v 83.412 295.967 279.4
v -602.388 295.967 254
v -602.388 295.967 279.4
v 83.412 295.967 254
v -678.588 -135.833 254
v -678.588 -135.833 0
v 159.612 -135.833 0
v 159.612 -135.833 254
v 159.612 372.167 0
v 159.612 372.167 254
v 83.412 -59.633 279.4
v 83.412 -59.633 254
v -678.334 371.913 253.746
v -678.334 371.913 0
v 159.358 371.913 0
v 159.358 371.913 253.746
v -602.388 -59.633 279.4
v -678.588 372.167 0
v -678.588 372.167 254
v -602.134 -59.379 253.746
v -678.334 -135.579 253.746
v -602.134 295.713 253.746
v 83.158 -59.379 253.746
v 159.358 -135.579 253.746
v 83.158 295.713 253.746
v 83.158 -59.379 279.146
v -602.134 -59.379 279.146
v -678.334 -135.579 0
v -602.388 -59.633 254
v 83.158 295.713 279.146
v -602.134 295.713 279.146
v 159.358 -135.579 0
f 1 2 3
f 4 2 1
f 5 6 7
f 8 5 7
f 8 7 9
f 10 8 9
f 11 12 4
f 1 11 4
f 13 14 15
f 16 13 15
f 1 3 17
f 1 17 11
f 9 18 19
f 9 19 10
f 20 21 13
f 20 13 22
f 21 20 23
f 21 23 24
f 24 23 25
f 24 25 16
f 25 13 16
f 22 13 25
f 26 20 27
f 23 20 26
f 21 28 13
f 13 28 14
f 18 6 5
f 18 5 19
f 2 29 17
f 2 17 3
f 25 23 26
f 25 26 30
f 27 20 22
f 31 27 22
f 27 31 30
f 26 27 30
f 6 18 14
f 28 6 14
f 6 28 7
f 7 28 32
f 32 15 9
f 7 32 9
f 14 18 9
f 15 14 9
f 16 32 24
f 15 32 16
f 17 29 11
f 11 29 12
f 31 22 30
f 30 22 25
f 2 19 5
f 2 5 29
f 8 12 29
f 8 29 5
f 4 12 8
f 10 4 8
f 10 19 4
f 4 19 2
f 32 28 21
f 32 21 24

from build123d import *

# Parameters (mm, degrees)
F0_W     = 838.2
F0_H     = 508
F0_W_2   = 685.8
F0_H_2   = 355.6
F1_DEPTH = 254
F2_DEPTH = 279.4
F3_T     = -0.254


with BuildPart() as f1:
    # F0 (on Top) → F1 (new body)
    with BuildSketch(Plane.XY):
        with Locations((-259.4876274824, 118.1668707132)):
            Rectangle(F0_W, F0_H)
        with Locations((-259.4876274824, 118.1668707132)):
            Rectangle(F0_W_2, F0_H_2, mode=Mode.SUBTRACT)
        with Locations((-259.4876274824, 118.1668707132)):
            Rectangle(F0_W_2, F0_H_2)
    extrude(amount=F1_DEPTH)

    # F0 (on Top) → F2 (join)
    with BuildSketch(Plane.XY):
        with Locations((-259.4876274824, 118.1668707132)):
            Rectangle(F0_W_2, F0_H_2)
    extrude(amount=F2_DEPTH)

    # F3
    f3_openings = [f1.faces().sort_by_distance(p)[0] for p in [
        (-259.487627, 118.166871, 0),
    ]]
    offset(amount=F3_T, openings=f3_openings, kind=Kind.INTERSECTION)


solid = f1.part
